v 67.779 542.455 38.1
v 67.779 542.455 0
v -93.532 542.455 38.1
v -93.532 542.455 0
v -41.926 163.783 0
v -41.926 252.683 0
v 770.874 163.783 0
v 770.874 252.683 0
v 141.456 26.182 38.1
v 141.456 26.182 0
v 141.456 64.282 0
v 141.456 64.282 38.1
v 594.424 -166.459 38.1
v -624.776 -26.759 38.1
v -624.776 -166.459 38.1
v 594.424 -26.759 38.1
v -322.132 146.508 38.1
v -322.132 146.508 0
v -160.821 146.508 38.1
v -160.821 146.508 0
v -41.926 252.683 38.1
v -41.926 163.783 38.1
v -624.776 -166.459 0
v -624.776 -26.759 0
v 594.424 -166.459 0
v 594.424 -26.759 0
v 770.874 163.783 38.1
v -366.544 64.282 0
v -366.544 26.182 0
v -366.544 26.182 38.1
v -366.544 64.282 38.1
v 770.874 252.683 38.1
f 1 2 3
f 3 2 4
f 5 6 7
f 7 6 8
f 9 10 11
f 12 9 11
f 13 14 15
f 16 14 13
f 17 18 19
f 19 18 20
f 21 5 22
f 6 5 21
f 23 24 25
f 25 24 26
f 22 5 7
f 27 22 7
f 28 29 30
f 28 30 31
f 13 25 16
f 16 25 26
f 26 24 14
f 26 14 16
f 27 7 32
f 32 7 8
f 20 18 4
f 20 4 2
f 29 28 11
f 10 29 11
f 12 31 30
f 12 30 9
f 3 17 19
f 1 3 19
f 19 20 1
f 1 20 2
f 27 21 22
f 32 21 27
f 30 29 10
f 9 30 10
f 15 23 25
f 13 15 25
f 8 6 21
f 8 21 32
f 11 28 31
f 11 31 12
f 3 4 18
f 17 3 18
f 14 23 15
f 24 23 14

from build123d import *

# Parameters (mm, degrees)
F0_W     = 1219.2
F0_H     = 139.7
F1_DEPTH = 38.1
F2_W     = 508
F2_H     = 38.1
F3_DEPTH = 38.1
F5_DEPTH = 38.1
F6_W     = 812.8
F6_H     = 88.9
F7_DEPTH = 38.1


with BuildPart() as f1:
    # F0 (on Top) → F1 (new body)
    with BuildSketch(Plane.XY):
        with Locations((-15.176143, -96.608518)):
            Rectangle(F0_W, F0_H)
    extrude(amount=F1_DEPTH)


with BuildPart() as f3:
    # F2 (on Top) → F3 (new body)
    with BuildSketch(Plane.XY):
        with Locations((-112.544402, 45.231579)):
            Rectangle(F2_W, F2_H)
    extrude(amount=F3_DEPTH)


with BuildPart() as f5:
    # F4 (on Top) → F5 (new body)
    with BuildSketch(Plane.XY):
        Polygon((-93.532276, 542.4549), (-322.132276, 146.508085), (-160.820611, 146.508085), (67.779389, 542.4549), align=None)
    extrude(amount=F5_DEPTH)


with BuildPart() as f7:
    # F6 (on Top) → F7 (new body)
    with BuildSketch(Plane.XY):
        with Locations((364.473906, 208.233155)):
            Rectangle(F6_W, F6_H)
    extrude(amount=F7_DEPTH)


solid = Compound([f1.part, f3.part, f5.part, f7.part])
